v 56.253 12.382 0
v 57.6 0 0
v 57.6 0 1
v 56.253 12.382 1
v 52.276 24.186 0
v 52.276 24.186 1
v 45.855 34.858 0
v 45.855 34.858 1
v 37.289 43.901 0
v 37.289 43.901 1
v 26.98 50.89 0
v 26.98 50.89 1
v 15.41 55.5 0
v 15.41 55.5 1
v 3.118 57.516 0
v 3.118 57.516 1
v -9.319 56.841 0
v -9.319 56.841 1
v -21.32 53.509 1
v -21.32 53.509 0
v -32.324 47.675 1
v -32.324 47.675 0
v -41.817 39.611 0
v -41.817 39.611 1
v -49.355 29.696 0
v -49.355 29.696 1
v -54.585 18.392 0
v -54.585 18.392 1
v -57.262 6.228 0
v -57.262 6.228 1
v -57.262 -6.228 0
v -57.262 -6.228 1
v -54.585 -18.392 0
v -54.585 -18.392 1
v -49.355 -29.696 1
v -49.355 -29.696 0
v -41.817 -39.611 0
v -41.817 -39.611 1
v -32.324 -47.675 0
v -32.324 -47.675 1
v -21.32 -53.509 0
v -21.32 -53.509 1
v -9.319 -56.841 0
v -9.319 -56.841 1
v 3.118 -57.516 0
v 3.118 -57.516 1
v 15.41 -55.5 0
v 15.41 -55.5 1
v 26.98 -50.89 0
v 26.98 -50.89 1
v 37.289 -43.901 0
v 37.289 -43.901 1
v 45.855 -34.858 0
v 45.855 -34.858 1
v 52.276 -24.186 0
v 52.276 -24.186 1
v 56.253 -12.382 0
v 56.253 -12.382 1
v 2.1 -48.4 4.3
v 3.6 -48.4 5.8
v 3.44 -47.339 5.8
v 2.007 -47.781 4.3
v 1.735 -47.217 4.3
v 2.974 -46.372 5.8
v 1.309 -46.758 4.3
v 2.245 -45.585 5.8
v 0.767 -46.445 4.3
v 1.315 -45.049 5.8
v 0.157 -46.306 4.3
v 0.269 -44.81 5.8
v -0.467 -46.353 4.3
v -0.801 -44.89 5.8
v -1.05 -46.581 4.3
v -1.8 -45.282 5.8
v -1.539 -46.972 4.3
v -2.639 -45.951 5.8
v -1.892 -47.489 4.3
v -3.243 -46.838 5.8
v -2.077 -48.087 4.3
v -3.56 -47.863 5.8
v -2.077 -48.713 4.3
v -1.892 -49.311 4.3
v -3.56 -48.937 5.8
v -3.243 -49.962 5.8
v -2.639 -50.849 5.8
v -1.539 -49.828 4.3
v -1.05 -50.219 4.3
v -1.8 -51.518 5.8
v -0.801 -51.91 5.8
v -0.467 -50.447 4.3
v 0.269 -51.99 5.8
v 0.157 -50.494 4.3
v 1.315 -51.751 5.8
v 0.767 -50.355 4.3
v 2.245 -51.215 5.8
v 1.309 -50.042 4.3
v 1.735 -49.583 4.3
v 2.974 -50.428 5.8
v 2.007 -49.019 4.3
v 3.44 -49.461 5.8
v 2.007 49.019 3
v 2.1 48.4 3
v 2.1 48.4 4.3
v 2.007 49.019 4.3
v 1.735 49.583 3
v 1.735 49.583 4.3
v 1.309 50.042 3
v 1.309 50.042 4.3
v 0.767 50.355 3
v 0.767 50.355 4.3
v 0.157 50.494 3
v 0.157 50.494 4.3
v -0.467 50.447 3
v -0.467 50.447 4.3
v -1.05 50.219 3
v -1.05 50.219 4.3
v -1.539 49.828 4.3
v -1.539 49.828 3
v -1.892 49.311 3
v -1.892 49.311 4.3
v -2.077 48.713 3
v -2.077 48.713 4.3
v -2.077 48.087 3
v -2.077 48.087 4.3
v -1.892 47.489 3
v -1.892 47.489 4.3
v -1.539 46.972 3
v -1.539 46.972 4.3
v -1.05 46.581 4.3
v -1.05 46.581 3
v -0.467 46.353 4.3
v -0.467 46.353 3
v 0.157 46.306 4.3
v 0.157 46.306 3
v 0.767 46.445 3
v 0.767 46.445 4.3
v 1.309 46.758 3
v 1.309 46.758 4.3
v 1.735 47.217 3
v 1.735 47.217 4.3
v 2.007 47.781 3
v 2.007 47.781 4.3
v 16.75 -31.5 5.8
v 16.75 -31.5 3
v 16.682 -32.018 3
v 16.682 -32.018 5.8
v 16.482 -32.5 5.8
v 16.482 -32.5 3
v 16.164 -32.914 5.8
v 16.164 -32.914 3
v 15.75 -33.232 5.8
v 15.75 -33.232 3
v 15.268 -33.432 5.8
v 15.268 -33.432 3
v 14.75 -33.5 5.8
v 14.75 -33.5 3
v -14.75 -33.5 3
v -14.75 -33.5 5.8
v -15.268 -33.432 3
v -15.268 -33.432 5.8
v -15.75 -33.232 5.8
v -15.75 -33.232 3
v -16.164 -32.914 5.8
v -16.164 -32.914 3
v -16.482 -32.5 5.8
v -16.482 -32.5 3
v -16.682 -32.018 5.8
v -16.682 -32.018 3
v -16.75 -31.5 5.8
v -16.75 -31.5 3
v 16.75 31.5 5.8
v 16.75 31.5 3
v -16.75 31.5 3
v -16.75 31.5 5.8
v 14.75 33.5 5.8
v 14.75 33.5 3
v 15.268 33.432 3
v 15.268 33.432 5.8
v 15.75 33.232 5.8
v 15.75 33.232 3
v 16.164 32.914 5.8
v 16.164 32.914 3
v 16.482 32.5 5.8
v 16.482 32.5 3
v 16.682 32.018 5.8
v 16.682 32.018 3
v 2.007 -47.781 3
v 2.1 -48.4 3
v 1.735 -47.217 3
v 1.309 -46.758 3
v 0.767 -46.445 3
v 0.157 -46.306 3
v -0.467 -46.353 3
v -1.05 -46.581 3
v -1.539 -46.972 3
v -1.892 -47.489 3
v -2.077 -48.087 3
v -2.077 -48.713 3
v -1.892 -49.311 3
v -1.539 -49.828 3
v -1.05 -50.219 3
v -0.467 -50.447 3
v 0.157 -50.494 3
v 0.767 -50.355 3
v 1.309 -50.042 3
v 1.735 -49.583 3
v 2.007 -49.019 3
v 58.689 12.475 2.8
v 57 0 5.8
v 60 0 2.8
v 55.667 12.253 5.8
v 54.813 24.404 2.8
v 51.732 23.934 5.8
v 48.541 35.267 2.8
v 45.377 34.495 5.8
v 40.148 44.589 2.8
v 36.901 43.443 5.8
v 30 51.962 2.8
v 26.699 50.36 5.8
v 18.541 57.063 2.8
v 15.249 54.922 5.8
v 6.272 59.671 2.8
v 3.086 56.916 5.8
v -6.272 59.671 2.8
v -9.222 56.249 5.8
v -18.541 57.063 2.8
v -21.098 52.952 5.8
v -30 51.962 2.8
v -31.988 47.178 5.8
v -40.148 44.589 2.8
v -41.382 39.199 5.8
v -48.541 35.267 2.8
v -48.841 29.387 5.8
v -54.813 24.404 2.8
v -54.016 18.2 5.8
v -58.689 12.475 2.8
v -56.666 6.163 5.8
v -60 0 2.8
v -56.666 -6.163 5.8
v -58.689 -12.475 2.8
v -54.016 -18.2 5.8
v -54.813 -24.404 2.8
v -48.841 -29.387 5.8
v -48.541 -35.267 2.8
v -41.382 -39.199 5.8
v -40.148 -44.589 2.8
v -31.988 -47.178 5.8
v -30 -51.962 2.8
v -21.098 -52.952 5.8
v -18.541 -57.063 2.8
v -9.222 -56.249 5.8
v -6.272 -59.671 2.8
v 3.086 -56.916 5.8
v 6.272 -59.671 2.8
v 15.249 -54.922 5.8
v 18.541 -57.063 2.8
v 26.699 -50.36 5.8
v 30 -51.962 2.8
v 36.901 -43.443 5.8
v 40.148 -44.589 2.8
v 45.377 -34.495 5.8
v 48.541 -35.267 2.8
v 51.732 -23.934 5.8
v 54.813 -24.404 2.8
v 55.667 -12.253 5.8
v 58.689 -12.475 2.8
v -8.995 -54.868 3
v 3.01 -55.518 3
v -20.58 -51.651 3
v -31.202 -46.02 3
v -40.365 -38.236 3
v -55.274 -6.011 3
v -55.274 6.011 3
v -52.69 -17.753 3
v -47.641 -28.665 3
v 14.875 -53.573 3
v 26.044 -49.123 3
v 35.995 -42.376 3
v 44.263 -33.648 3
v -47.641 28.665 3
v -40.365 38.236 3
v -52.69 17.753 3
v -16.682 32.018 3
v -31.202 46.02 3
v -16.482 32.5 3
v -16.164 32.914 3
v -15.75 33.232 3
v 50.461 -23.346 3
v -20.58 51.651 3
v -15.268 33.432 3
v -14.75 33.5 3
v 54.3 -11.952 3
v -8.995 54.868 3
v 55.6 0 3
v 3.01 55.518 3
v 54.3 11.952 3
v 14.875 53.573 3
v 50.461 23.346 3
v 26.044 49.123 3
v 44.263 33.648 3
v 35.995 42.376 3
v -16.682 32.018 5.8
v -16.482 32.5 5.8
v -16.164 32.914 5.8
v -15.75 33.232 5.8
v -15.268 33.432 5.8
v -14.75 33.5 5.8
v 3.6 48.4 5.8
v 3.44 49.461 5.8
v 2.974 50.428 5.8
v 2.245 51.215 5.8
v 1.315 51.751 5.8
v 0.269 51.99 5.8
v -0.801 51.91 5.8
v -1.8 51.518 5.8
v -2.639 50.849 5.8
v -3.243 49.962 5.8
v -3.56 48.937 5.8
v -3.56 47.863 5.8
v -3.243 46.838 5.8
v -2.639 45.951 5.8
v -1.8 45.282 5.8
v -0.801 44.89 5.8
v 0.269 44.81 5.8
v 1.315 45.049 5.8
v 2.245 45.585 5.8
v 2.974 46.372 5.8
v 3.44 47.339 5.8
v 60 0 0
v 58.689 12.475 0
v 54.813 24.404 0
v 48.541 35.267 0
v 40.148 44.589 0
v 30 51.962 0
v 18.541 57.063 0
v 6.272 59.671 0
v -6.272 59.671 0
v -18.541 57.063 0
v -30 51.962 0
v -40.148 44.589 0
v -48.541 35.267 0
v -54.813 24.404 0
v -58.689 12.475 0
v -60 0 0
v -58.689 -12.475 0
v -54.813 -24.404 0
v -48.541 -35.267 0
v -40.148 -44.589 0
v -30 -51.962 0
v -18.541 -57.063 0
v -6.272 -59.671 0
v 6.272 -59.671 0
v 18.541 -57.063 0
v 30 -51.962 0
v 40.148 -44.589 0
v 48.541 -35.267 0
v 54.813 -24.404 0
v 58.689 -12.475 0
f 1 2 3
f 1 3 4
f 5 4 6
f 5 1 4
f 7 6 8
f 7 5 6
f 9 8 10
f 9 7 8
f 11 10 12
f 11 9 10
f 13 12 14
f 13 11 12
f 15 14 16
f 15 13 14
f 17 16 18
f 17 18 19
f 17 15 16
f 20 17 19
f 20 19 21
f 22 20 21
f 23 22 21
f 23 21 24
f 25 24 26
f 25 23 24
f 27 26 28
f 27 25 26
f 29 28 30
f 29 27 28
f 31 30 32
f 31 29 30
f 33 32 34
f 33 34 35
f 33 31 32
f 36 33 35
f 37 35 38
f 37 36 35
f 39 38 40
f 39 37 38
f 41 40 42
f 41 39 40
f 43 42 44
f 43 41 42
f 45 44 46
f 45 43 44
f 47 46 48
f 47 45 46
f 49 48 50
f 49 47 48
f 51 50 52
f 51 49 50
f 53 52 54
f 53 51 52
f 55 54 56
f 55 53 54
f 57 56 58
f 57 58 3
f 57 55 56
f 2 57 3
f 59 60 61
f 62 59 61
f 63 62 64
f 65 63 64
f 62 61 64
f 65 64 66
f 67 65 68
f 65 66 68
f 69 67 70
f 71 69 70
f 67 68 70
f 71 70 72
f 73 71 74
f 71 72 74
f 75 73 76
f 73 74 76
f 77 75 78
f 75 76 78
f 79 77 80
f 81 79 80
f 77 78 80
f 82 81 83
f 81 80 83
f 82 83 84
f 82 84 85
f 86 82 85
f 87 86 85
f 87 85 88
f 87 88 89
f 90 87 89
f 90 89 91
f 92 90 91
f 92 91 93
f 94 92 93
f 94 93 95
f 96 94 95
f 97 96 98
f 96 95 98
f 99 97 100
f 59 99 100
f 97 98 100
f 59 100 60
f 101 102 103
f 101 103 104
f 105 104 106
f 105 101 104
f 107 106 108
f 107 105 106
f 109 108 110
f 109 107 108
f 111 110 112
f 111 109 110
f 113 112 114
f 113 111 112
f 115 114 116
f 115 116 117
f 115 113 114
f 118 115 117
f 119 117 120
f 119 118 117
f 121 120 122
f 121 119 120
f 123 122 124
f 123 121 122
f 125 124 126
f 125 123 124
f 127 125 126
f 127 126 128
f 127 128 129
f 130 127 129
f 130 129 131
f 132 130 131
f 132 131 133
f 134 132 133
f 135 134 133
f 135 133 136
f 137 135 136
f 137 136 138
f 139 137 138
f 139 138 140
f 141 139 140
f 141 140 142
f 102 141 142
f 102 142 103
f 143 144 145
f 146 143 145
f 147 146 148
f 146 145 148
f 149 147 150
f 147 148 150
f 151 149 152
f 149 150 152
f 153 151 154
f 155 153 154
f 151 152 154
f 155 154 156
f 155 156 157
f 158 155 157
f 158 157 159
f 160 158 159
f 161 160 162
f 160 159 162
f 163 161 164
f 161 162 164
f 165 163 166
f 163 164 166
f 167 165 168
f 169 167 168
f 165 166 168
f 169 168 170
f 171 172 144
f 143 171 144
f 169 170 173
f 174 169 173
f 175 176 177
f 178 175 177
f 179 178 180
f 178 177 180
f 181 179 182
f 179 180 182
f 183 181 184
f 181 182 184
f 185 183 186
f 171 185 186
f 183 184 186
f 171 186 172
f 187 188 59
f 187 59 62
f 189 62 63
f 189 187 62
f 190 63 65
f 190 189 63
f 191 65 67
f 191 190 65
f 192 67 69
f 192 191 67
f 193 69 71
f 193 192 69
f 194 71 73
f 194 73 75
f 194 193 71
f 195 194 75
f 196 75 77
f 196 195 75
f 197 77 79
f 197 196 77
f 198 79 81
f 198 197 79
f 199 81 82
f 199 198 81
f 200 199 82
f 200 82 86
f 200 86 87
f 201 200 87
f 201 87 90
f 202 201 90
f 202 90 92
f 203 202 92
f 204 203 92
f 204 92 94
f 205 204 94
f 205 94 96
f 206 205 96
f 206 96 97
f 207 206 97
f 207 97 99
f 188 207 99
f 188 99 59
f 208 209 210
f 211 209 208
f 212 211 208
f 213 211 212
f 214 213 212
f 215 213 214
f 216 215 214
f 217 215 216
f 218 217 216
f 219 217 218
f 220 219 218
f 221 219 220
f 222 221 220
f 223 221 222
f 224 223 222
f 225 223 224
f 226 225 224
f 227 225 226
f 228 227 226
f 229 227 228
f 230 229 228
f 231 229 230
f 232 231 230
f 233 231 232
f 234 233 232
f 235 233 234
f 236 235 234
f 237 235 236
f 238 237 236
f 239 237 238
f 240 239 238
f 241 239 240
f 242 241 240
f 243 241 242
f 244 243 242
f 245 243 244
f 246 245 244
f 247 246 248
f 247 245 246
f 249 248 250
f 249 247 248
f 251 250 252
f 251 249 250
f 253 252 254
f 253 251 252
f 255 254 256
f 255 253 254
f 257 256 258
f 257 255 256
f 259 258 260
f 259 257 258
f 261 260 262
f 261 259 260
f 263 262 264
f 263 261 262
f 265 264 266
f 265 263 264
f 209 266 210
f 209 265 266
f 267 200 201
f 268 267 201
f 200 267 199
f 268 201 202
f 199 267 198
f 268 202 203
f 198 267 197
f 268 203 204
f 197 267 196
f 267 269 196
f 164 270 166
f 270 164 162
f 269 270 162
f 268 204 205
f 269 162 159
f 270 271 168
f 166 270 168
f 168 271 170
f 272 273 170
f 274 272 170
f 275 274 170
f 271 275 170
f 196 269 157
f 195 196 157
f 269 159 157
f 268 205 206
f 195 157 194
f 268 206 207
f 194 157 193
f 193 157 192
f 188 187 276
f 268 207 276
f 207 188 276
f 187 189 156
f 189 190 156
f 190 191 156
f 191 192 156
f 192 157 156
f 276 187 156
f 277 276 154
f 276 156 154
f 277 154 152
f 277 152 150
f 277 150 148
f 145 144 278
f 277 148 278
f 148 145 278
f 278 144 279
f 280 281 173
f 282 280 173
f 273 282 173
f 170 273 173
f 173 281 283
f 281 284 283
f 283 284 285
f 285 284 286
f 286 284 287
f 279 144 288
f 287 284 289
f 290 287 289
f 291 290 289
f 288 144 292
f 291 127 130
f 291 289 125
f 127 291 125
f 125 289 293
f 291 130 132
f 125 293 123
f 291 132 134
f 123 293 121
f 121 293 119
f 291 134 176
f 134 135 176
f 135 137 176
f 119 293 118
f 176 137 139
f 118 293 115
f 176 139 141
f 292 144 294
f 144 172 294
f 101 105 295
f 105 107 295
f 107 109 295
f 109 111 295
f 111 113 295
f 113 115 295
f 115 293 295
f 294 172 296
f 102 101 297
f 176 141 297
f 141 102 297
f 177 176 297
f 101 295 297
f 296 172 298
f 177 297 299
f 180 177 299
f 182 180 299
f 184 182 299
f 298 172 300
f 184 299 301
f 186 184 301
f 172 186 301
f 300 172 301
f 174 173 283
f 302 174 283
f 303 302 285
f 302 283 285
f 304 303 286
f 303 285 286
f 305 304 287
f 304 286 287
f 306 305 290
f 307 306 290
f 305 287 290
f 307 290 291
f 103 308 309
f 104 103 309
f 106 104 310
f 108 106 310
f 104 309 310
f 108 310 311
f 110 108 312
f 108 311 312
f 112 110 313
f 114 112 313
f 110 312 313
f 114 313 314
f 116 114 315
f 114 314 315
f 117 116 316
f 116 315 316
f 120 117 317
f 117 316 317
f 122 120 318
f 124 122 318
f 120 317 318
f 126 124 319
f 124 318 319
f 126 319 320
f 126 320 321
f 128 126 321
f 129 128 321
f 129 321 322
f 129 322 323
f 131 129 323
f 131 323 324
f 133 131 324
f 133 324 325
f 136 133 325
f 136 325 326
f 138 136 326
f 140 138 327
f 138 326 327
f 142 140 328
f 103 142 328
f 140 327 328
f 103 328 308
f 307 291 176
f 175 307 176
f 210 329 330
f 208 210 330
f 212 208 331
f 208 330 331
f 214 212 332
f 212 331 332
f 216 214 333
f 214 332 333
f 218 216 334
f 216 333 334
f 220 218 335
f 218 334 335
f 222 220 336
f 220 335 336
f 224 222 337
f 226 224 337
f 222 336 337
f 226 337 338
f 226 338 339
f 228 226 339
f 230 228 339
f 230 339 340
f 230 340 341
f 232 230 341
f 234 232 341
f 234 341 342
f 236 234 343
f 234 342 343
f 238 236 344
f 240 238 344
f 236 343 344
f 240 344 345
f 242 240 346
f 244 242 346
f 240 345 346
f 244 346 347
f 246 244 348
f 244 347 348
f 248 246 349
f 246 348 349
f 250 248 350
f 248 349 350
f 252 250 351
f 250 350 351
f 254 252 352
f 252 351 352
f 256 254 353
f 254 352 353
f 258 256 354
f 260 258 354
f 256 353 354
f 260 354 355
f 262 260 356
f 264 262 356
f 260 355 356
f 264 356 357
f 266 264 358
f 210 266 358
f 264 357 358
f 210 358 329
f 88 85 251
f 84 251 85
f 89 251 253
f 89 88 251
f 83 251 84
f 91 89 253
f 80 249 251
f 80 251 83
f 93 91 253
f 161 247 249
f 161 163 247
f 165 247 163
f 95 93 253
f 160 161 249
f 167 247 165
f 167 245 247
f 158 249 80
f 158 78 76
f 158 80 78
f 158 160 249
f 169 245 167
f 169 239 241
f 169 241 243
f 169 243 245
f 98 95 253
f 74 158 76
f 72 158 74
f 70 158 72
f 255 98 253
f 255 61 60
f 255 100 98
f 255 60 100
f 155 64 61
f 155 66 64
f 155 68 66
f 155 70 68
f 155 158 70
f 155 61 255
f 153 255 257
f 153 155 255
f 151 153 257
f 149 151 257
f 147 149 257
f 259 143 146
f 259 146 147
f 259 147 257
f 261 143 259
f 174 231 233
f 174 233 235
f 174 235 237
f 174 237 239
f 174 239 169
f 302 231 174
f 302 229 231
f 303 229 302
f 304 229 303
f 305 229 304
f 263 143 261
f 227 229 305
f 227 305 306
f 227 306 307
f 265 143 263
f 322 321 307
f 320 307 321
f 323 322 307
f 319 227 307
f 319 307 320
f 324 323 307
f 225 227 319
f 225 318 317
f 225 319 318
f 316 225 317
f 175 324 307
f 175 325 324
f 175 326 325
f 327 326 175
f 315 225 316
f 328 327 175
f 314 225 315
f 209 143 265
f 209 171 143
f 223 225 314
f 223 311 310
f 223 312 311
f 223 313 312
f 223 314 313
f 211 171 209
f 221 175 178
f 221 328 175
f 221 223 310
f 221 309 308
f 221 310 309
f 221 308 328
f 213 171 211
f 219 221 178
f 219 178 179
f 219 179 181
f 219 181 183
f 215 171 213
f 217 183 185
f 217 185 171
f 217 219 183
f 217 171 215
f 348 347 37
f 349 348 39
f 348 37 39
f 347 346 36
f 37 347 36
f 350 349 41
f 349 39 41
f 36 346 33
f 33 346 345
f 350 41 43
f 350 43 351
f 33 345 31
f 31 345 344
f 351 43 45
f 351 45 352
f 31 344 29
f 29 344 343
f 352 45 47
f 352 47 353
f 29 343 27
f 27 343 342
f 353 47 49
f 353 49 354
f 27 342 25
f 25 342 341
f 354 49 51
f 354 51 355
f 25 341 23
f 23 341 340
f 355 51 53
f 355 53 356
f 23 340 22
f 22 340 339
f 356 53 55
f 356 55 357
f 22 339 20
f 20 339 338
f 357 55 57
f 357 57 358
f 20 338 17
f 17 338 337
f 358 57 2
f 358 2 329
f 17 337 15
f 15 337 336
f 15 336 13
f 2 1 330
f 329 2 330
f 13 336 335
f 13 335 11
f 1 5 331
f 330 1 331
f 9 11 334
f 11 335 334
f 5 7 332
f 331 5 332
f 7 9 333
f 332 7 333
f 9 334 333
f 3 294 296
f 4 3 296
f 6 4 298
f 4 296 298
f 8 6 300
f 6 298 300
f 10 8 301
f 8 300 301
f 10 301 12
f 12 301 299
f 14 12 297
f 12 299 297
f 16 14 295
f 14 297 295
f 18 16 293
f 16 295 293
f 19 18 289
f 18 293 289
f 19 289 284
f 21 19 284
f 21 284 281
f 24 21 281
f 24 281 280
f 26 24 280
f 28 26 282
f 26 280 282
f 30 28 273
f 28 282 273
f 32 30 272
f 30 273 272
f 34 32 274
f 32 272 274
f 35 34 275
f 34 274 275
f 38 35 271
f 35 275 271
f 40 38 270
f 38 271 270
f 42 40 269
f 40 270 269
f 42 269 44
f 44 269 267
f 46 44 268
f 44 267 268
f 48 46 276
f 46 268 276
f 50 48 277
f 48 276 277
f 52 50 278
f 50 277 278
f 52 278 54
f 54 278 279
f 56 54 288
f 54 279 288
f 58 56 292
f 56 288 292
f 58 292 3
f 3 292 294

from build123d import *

# Parameters (mm, degrees)
F0_R     = 60
F0_R_2   = 57.6
F0_R_3   = 2.1
F1_DEPTH = 5.8
F2_SIZE  = 3
F3_DEPTH = 3
F4_SIZE  = 2
F5_SIZE  = 1.5


with BuildPart() as f1:
    # F0 (on Top) → F1 (new body)
    with BuildSketch(Plane.XY):
        Circle(F0_R)
        Circle(F0_R_2, mode=Mode.SUBTRACT)
        Circle(F0_R_2)
        with Locations((0, -48.4)):
            Circle(F0_R_3, mode=Mode.SUBTRACT)
        with BuildLine():
            Line((-14.75, 33.5), (14.75, 33.5))
            ThreePointArc((14.75, 33.5), (16.164214, 32.914214), (16.75, 31.5))
            Line((16.75, 31.5), (16.75, -31.5))
            ThreePointArc((16.75, -31.5), (16.164214, -32.914214), (14.75, -33.5))
            Line((14.75, -33.5), (-14.75, -33.5))
            ThreePointArc((-14.75, -33.5), (-16.164214, -32.914214), (-16.75, -31.5))
            Line((-16.75, -31.5), (-16.75, 31.5))
            ThreePointArc((-16.75, 31.5), (-16.164214, 32.914214), (-14.75, 33.5))
        make_face(mode=Mode.SUBTRACT)
        with Locations((0, 48.4)):
            Circle(F0_R_3, mode=Mode.SUBTRACT)
    extrude(amount=F1_DEPTH)

    # F2
    f2_edges = [f1.edges().sort_by_distance(p)[0] for p in [
        (-60, 0, 5.8),
    ]]
    chamfer(f2_edges, length=F2_SIZE)

    # F0 (on Top) → F3 (cut)
    with BuildSketch(Plane.XY):
        Circle(F0_R_2)
        with Locations((0, -48.4)):
            Circle(F0_R_3, mode=Mode.SUBTRACT)
        with BuildLine():
            Line((-14.75, 33.5), (14.75, 33.5))
            ThreePointArc((14.75, 33.5), (16.164214, 32.914214), (16.75, 31.5))
            Line((16.75, 31.5), (16.75, -31.5))
            ThreePointArc((16.75, -31.5), (16.164214, -32.914214), (14.75, -33.5))
            Line((14.75, -33.5), (-14.75, -33.5))
            ThreePointArc((-14.75, -33.5), (-16.164214, -32.914214), (-16.75, -31.5))
            Line((-16.75, -31.5), (-16.75, 31.5))
            ThreePointArc((-16.75, 31.5), (-16.164214, 32.914214), (-14.75, 33.5))
        make_face(mode=Mode.SUBTRACT)
        with Locations((0, 48.4)):
            Circle(F0_R_3, mode=Mode.SUBTRACT)
    extrude(amount=F3_DEPTH, mode=Mode.SUBTRACT)

    # F4
    f4_edges = [f1.edges().sort_by_distance(p)[0] for p in [
        (-57.6, 0, 3),
    ]]
    chamfer(f4_edges, length=F4_SIZE)

    # F5
    f5_edges = [f1.edges().sort_by_distance(p)[0] for p in [
        (-2.1, -48.4, 5.8),
        (-2.1, 48.4, 5.8),
    ]]
    chamfer(f5_edges, length=F5_SIZE)


solid = f1.part
